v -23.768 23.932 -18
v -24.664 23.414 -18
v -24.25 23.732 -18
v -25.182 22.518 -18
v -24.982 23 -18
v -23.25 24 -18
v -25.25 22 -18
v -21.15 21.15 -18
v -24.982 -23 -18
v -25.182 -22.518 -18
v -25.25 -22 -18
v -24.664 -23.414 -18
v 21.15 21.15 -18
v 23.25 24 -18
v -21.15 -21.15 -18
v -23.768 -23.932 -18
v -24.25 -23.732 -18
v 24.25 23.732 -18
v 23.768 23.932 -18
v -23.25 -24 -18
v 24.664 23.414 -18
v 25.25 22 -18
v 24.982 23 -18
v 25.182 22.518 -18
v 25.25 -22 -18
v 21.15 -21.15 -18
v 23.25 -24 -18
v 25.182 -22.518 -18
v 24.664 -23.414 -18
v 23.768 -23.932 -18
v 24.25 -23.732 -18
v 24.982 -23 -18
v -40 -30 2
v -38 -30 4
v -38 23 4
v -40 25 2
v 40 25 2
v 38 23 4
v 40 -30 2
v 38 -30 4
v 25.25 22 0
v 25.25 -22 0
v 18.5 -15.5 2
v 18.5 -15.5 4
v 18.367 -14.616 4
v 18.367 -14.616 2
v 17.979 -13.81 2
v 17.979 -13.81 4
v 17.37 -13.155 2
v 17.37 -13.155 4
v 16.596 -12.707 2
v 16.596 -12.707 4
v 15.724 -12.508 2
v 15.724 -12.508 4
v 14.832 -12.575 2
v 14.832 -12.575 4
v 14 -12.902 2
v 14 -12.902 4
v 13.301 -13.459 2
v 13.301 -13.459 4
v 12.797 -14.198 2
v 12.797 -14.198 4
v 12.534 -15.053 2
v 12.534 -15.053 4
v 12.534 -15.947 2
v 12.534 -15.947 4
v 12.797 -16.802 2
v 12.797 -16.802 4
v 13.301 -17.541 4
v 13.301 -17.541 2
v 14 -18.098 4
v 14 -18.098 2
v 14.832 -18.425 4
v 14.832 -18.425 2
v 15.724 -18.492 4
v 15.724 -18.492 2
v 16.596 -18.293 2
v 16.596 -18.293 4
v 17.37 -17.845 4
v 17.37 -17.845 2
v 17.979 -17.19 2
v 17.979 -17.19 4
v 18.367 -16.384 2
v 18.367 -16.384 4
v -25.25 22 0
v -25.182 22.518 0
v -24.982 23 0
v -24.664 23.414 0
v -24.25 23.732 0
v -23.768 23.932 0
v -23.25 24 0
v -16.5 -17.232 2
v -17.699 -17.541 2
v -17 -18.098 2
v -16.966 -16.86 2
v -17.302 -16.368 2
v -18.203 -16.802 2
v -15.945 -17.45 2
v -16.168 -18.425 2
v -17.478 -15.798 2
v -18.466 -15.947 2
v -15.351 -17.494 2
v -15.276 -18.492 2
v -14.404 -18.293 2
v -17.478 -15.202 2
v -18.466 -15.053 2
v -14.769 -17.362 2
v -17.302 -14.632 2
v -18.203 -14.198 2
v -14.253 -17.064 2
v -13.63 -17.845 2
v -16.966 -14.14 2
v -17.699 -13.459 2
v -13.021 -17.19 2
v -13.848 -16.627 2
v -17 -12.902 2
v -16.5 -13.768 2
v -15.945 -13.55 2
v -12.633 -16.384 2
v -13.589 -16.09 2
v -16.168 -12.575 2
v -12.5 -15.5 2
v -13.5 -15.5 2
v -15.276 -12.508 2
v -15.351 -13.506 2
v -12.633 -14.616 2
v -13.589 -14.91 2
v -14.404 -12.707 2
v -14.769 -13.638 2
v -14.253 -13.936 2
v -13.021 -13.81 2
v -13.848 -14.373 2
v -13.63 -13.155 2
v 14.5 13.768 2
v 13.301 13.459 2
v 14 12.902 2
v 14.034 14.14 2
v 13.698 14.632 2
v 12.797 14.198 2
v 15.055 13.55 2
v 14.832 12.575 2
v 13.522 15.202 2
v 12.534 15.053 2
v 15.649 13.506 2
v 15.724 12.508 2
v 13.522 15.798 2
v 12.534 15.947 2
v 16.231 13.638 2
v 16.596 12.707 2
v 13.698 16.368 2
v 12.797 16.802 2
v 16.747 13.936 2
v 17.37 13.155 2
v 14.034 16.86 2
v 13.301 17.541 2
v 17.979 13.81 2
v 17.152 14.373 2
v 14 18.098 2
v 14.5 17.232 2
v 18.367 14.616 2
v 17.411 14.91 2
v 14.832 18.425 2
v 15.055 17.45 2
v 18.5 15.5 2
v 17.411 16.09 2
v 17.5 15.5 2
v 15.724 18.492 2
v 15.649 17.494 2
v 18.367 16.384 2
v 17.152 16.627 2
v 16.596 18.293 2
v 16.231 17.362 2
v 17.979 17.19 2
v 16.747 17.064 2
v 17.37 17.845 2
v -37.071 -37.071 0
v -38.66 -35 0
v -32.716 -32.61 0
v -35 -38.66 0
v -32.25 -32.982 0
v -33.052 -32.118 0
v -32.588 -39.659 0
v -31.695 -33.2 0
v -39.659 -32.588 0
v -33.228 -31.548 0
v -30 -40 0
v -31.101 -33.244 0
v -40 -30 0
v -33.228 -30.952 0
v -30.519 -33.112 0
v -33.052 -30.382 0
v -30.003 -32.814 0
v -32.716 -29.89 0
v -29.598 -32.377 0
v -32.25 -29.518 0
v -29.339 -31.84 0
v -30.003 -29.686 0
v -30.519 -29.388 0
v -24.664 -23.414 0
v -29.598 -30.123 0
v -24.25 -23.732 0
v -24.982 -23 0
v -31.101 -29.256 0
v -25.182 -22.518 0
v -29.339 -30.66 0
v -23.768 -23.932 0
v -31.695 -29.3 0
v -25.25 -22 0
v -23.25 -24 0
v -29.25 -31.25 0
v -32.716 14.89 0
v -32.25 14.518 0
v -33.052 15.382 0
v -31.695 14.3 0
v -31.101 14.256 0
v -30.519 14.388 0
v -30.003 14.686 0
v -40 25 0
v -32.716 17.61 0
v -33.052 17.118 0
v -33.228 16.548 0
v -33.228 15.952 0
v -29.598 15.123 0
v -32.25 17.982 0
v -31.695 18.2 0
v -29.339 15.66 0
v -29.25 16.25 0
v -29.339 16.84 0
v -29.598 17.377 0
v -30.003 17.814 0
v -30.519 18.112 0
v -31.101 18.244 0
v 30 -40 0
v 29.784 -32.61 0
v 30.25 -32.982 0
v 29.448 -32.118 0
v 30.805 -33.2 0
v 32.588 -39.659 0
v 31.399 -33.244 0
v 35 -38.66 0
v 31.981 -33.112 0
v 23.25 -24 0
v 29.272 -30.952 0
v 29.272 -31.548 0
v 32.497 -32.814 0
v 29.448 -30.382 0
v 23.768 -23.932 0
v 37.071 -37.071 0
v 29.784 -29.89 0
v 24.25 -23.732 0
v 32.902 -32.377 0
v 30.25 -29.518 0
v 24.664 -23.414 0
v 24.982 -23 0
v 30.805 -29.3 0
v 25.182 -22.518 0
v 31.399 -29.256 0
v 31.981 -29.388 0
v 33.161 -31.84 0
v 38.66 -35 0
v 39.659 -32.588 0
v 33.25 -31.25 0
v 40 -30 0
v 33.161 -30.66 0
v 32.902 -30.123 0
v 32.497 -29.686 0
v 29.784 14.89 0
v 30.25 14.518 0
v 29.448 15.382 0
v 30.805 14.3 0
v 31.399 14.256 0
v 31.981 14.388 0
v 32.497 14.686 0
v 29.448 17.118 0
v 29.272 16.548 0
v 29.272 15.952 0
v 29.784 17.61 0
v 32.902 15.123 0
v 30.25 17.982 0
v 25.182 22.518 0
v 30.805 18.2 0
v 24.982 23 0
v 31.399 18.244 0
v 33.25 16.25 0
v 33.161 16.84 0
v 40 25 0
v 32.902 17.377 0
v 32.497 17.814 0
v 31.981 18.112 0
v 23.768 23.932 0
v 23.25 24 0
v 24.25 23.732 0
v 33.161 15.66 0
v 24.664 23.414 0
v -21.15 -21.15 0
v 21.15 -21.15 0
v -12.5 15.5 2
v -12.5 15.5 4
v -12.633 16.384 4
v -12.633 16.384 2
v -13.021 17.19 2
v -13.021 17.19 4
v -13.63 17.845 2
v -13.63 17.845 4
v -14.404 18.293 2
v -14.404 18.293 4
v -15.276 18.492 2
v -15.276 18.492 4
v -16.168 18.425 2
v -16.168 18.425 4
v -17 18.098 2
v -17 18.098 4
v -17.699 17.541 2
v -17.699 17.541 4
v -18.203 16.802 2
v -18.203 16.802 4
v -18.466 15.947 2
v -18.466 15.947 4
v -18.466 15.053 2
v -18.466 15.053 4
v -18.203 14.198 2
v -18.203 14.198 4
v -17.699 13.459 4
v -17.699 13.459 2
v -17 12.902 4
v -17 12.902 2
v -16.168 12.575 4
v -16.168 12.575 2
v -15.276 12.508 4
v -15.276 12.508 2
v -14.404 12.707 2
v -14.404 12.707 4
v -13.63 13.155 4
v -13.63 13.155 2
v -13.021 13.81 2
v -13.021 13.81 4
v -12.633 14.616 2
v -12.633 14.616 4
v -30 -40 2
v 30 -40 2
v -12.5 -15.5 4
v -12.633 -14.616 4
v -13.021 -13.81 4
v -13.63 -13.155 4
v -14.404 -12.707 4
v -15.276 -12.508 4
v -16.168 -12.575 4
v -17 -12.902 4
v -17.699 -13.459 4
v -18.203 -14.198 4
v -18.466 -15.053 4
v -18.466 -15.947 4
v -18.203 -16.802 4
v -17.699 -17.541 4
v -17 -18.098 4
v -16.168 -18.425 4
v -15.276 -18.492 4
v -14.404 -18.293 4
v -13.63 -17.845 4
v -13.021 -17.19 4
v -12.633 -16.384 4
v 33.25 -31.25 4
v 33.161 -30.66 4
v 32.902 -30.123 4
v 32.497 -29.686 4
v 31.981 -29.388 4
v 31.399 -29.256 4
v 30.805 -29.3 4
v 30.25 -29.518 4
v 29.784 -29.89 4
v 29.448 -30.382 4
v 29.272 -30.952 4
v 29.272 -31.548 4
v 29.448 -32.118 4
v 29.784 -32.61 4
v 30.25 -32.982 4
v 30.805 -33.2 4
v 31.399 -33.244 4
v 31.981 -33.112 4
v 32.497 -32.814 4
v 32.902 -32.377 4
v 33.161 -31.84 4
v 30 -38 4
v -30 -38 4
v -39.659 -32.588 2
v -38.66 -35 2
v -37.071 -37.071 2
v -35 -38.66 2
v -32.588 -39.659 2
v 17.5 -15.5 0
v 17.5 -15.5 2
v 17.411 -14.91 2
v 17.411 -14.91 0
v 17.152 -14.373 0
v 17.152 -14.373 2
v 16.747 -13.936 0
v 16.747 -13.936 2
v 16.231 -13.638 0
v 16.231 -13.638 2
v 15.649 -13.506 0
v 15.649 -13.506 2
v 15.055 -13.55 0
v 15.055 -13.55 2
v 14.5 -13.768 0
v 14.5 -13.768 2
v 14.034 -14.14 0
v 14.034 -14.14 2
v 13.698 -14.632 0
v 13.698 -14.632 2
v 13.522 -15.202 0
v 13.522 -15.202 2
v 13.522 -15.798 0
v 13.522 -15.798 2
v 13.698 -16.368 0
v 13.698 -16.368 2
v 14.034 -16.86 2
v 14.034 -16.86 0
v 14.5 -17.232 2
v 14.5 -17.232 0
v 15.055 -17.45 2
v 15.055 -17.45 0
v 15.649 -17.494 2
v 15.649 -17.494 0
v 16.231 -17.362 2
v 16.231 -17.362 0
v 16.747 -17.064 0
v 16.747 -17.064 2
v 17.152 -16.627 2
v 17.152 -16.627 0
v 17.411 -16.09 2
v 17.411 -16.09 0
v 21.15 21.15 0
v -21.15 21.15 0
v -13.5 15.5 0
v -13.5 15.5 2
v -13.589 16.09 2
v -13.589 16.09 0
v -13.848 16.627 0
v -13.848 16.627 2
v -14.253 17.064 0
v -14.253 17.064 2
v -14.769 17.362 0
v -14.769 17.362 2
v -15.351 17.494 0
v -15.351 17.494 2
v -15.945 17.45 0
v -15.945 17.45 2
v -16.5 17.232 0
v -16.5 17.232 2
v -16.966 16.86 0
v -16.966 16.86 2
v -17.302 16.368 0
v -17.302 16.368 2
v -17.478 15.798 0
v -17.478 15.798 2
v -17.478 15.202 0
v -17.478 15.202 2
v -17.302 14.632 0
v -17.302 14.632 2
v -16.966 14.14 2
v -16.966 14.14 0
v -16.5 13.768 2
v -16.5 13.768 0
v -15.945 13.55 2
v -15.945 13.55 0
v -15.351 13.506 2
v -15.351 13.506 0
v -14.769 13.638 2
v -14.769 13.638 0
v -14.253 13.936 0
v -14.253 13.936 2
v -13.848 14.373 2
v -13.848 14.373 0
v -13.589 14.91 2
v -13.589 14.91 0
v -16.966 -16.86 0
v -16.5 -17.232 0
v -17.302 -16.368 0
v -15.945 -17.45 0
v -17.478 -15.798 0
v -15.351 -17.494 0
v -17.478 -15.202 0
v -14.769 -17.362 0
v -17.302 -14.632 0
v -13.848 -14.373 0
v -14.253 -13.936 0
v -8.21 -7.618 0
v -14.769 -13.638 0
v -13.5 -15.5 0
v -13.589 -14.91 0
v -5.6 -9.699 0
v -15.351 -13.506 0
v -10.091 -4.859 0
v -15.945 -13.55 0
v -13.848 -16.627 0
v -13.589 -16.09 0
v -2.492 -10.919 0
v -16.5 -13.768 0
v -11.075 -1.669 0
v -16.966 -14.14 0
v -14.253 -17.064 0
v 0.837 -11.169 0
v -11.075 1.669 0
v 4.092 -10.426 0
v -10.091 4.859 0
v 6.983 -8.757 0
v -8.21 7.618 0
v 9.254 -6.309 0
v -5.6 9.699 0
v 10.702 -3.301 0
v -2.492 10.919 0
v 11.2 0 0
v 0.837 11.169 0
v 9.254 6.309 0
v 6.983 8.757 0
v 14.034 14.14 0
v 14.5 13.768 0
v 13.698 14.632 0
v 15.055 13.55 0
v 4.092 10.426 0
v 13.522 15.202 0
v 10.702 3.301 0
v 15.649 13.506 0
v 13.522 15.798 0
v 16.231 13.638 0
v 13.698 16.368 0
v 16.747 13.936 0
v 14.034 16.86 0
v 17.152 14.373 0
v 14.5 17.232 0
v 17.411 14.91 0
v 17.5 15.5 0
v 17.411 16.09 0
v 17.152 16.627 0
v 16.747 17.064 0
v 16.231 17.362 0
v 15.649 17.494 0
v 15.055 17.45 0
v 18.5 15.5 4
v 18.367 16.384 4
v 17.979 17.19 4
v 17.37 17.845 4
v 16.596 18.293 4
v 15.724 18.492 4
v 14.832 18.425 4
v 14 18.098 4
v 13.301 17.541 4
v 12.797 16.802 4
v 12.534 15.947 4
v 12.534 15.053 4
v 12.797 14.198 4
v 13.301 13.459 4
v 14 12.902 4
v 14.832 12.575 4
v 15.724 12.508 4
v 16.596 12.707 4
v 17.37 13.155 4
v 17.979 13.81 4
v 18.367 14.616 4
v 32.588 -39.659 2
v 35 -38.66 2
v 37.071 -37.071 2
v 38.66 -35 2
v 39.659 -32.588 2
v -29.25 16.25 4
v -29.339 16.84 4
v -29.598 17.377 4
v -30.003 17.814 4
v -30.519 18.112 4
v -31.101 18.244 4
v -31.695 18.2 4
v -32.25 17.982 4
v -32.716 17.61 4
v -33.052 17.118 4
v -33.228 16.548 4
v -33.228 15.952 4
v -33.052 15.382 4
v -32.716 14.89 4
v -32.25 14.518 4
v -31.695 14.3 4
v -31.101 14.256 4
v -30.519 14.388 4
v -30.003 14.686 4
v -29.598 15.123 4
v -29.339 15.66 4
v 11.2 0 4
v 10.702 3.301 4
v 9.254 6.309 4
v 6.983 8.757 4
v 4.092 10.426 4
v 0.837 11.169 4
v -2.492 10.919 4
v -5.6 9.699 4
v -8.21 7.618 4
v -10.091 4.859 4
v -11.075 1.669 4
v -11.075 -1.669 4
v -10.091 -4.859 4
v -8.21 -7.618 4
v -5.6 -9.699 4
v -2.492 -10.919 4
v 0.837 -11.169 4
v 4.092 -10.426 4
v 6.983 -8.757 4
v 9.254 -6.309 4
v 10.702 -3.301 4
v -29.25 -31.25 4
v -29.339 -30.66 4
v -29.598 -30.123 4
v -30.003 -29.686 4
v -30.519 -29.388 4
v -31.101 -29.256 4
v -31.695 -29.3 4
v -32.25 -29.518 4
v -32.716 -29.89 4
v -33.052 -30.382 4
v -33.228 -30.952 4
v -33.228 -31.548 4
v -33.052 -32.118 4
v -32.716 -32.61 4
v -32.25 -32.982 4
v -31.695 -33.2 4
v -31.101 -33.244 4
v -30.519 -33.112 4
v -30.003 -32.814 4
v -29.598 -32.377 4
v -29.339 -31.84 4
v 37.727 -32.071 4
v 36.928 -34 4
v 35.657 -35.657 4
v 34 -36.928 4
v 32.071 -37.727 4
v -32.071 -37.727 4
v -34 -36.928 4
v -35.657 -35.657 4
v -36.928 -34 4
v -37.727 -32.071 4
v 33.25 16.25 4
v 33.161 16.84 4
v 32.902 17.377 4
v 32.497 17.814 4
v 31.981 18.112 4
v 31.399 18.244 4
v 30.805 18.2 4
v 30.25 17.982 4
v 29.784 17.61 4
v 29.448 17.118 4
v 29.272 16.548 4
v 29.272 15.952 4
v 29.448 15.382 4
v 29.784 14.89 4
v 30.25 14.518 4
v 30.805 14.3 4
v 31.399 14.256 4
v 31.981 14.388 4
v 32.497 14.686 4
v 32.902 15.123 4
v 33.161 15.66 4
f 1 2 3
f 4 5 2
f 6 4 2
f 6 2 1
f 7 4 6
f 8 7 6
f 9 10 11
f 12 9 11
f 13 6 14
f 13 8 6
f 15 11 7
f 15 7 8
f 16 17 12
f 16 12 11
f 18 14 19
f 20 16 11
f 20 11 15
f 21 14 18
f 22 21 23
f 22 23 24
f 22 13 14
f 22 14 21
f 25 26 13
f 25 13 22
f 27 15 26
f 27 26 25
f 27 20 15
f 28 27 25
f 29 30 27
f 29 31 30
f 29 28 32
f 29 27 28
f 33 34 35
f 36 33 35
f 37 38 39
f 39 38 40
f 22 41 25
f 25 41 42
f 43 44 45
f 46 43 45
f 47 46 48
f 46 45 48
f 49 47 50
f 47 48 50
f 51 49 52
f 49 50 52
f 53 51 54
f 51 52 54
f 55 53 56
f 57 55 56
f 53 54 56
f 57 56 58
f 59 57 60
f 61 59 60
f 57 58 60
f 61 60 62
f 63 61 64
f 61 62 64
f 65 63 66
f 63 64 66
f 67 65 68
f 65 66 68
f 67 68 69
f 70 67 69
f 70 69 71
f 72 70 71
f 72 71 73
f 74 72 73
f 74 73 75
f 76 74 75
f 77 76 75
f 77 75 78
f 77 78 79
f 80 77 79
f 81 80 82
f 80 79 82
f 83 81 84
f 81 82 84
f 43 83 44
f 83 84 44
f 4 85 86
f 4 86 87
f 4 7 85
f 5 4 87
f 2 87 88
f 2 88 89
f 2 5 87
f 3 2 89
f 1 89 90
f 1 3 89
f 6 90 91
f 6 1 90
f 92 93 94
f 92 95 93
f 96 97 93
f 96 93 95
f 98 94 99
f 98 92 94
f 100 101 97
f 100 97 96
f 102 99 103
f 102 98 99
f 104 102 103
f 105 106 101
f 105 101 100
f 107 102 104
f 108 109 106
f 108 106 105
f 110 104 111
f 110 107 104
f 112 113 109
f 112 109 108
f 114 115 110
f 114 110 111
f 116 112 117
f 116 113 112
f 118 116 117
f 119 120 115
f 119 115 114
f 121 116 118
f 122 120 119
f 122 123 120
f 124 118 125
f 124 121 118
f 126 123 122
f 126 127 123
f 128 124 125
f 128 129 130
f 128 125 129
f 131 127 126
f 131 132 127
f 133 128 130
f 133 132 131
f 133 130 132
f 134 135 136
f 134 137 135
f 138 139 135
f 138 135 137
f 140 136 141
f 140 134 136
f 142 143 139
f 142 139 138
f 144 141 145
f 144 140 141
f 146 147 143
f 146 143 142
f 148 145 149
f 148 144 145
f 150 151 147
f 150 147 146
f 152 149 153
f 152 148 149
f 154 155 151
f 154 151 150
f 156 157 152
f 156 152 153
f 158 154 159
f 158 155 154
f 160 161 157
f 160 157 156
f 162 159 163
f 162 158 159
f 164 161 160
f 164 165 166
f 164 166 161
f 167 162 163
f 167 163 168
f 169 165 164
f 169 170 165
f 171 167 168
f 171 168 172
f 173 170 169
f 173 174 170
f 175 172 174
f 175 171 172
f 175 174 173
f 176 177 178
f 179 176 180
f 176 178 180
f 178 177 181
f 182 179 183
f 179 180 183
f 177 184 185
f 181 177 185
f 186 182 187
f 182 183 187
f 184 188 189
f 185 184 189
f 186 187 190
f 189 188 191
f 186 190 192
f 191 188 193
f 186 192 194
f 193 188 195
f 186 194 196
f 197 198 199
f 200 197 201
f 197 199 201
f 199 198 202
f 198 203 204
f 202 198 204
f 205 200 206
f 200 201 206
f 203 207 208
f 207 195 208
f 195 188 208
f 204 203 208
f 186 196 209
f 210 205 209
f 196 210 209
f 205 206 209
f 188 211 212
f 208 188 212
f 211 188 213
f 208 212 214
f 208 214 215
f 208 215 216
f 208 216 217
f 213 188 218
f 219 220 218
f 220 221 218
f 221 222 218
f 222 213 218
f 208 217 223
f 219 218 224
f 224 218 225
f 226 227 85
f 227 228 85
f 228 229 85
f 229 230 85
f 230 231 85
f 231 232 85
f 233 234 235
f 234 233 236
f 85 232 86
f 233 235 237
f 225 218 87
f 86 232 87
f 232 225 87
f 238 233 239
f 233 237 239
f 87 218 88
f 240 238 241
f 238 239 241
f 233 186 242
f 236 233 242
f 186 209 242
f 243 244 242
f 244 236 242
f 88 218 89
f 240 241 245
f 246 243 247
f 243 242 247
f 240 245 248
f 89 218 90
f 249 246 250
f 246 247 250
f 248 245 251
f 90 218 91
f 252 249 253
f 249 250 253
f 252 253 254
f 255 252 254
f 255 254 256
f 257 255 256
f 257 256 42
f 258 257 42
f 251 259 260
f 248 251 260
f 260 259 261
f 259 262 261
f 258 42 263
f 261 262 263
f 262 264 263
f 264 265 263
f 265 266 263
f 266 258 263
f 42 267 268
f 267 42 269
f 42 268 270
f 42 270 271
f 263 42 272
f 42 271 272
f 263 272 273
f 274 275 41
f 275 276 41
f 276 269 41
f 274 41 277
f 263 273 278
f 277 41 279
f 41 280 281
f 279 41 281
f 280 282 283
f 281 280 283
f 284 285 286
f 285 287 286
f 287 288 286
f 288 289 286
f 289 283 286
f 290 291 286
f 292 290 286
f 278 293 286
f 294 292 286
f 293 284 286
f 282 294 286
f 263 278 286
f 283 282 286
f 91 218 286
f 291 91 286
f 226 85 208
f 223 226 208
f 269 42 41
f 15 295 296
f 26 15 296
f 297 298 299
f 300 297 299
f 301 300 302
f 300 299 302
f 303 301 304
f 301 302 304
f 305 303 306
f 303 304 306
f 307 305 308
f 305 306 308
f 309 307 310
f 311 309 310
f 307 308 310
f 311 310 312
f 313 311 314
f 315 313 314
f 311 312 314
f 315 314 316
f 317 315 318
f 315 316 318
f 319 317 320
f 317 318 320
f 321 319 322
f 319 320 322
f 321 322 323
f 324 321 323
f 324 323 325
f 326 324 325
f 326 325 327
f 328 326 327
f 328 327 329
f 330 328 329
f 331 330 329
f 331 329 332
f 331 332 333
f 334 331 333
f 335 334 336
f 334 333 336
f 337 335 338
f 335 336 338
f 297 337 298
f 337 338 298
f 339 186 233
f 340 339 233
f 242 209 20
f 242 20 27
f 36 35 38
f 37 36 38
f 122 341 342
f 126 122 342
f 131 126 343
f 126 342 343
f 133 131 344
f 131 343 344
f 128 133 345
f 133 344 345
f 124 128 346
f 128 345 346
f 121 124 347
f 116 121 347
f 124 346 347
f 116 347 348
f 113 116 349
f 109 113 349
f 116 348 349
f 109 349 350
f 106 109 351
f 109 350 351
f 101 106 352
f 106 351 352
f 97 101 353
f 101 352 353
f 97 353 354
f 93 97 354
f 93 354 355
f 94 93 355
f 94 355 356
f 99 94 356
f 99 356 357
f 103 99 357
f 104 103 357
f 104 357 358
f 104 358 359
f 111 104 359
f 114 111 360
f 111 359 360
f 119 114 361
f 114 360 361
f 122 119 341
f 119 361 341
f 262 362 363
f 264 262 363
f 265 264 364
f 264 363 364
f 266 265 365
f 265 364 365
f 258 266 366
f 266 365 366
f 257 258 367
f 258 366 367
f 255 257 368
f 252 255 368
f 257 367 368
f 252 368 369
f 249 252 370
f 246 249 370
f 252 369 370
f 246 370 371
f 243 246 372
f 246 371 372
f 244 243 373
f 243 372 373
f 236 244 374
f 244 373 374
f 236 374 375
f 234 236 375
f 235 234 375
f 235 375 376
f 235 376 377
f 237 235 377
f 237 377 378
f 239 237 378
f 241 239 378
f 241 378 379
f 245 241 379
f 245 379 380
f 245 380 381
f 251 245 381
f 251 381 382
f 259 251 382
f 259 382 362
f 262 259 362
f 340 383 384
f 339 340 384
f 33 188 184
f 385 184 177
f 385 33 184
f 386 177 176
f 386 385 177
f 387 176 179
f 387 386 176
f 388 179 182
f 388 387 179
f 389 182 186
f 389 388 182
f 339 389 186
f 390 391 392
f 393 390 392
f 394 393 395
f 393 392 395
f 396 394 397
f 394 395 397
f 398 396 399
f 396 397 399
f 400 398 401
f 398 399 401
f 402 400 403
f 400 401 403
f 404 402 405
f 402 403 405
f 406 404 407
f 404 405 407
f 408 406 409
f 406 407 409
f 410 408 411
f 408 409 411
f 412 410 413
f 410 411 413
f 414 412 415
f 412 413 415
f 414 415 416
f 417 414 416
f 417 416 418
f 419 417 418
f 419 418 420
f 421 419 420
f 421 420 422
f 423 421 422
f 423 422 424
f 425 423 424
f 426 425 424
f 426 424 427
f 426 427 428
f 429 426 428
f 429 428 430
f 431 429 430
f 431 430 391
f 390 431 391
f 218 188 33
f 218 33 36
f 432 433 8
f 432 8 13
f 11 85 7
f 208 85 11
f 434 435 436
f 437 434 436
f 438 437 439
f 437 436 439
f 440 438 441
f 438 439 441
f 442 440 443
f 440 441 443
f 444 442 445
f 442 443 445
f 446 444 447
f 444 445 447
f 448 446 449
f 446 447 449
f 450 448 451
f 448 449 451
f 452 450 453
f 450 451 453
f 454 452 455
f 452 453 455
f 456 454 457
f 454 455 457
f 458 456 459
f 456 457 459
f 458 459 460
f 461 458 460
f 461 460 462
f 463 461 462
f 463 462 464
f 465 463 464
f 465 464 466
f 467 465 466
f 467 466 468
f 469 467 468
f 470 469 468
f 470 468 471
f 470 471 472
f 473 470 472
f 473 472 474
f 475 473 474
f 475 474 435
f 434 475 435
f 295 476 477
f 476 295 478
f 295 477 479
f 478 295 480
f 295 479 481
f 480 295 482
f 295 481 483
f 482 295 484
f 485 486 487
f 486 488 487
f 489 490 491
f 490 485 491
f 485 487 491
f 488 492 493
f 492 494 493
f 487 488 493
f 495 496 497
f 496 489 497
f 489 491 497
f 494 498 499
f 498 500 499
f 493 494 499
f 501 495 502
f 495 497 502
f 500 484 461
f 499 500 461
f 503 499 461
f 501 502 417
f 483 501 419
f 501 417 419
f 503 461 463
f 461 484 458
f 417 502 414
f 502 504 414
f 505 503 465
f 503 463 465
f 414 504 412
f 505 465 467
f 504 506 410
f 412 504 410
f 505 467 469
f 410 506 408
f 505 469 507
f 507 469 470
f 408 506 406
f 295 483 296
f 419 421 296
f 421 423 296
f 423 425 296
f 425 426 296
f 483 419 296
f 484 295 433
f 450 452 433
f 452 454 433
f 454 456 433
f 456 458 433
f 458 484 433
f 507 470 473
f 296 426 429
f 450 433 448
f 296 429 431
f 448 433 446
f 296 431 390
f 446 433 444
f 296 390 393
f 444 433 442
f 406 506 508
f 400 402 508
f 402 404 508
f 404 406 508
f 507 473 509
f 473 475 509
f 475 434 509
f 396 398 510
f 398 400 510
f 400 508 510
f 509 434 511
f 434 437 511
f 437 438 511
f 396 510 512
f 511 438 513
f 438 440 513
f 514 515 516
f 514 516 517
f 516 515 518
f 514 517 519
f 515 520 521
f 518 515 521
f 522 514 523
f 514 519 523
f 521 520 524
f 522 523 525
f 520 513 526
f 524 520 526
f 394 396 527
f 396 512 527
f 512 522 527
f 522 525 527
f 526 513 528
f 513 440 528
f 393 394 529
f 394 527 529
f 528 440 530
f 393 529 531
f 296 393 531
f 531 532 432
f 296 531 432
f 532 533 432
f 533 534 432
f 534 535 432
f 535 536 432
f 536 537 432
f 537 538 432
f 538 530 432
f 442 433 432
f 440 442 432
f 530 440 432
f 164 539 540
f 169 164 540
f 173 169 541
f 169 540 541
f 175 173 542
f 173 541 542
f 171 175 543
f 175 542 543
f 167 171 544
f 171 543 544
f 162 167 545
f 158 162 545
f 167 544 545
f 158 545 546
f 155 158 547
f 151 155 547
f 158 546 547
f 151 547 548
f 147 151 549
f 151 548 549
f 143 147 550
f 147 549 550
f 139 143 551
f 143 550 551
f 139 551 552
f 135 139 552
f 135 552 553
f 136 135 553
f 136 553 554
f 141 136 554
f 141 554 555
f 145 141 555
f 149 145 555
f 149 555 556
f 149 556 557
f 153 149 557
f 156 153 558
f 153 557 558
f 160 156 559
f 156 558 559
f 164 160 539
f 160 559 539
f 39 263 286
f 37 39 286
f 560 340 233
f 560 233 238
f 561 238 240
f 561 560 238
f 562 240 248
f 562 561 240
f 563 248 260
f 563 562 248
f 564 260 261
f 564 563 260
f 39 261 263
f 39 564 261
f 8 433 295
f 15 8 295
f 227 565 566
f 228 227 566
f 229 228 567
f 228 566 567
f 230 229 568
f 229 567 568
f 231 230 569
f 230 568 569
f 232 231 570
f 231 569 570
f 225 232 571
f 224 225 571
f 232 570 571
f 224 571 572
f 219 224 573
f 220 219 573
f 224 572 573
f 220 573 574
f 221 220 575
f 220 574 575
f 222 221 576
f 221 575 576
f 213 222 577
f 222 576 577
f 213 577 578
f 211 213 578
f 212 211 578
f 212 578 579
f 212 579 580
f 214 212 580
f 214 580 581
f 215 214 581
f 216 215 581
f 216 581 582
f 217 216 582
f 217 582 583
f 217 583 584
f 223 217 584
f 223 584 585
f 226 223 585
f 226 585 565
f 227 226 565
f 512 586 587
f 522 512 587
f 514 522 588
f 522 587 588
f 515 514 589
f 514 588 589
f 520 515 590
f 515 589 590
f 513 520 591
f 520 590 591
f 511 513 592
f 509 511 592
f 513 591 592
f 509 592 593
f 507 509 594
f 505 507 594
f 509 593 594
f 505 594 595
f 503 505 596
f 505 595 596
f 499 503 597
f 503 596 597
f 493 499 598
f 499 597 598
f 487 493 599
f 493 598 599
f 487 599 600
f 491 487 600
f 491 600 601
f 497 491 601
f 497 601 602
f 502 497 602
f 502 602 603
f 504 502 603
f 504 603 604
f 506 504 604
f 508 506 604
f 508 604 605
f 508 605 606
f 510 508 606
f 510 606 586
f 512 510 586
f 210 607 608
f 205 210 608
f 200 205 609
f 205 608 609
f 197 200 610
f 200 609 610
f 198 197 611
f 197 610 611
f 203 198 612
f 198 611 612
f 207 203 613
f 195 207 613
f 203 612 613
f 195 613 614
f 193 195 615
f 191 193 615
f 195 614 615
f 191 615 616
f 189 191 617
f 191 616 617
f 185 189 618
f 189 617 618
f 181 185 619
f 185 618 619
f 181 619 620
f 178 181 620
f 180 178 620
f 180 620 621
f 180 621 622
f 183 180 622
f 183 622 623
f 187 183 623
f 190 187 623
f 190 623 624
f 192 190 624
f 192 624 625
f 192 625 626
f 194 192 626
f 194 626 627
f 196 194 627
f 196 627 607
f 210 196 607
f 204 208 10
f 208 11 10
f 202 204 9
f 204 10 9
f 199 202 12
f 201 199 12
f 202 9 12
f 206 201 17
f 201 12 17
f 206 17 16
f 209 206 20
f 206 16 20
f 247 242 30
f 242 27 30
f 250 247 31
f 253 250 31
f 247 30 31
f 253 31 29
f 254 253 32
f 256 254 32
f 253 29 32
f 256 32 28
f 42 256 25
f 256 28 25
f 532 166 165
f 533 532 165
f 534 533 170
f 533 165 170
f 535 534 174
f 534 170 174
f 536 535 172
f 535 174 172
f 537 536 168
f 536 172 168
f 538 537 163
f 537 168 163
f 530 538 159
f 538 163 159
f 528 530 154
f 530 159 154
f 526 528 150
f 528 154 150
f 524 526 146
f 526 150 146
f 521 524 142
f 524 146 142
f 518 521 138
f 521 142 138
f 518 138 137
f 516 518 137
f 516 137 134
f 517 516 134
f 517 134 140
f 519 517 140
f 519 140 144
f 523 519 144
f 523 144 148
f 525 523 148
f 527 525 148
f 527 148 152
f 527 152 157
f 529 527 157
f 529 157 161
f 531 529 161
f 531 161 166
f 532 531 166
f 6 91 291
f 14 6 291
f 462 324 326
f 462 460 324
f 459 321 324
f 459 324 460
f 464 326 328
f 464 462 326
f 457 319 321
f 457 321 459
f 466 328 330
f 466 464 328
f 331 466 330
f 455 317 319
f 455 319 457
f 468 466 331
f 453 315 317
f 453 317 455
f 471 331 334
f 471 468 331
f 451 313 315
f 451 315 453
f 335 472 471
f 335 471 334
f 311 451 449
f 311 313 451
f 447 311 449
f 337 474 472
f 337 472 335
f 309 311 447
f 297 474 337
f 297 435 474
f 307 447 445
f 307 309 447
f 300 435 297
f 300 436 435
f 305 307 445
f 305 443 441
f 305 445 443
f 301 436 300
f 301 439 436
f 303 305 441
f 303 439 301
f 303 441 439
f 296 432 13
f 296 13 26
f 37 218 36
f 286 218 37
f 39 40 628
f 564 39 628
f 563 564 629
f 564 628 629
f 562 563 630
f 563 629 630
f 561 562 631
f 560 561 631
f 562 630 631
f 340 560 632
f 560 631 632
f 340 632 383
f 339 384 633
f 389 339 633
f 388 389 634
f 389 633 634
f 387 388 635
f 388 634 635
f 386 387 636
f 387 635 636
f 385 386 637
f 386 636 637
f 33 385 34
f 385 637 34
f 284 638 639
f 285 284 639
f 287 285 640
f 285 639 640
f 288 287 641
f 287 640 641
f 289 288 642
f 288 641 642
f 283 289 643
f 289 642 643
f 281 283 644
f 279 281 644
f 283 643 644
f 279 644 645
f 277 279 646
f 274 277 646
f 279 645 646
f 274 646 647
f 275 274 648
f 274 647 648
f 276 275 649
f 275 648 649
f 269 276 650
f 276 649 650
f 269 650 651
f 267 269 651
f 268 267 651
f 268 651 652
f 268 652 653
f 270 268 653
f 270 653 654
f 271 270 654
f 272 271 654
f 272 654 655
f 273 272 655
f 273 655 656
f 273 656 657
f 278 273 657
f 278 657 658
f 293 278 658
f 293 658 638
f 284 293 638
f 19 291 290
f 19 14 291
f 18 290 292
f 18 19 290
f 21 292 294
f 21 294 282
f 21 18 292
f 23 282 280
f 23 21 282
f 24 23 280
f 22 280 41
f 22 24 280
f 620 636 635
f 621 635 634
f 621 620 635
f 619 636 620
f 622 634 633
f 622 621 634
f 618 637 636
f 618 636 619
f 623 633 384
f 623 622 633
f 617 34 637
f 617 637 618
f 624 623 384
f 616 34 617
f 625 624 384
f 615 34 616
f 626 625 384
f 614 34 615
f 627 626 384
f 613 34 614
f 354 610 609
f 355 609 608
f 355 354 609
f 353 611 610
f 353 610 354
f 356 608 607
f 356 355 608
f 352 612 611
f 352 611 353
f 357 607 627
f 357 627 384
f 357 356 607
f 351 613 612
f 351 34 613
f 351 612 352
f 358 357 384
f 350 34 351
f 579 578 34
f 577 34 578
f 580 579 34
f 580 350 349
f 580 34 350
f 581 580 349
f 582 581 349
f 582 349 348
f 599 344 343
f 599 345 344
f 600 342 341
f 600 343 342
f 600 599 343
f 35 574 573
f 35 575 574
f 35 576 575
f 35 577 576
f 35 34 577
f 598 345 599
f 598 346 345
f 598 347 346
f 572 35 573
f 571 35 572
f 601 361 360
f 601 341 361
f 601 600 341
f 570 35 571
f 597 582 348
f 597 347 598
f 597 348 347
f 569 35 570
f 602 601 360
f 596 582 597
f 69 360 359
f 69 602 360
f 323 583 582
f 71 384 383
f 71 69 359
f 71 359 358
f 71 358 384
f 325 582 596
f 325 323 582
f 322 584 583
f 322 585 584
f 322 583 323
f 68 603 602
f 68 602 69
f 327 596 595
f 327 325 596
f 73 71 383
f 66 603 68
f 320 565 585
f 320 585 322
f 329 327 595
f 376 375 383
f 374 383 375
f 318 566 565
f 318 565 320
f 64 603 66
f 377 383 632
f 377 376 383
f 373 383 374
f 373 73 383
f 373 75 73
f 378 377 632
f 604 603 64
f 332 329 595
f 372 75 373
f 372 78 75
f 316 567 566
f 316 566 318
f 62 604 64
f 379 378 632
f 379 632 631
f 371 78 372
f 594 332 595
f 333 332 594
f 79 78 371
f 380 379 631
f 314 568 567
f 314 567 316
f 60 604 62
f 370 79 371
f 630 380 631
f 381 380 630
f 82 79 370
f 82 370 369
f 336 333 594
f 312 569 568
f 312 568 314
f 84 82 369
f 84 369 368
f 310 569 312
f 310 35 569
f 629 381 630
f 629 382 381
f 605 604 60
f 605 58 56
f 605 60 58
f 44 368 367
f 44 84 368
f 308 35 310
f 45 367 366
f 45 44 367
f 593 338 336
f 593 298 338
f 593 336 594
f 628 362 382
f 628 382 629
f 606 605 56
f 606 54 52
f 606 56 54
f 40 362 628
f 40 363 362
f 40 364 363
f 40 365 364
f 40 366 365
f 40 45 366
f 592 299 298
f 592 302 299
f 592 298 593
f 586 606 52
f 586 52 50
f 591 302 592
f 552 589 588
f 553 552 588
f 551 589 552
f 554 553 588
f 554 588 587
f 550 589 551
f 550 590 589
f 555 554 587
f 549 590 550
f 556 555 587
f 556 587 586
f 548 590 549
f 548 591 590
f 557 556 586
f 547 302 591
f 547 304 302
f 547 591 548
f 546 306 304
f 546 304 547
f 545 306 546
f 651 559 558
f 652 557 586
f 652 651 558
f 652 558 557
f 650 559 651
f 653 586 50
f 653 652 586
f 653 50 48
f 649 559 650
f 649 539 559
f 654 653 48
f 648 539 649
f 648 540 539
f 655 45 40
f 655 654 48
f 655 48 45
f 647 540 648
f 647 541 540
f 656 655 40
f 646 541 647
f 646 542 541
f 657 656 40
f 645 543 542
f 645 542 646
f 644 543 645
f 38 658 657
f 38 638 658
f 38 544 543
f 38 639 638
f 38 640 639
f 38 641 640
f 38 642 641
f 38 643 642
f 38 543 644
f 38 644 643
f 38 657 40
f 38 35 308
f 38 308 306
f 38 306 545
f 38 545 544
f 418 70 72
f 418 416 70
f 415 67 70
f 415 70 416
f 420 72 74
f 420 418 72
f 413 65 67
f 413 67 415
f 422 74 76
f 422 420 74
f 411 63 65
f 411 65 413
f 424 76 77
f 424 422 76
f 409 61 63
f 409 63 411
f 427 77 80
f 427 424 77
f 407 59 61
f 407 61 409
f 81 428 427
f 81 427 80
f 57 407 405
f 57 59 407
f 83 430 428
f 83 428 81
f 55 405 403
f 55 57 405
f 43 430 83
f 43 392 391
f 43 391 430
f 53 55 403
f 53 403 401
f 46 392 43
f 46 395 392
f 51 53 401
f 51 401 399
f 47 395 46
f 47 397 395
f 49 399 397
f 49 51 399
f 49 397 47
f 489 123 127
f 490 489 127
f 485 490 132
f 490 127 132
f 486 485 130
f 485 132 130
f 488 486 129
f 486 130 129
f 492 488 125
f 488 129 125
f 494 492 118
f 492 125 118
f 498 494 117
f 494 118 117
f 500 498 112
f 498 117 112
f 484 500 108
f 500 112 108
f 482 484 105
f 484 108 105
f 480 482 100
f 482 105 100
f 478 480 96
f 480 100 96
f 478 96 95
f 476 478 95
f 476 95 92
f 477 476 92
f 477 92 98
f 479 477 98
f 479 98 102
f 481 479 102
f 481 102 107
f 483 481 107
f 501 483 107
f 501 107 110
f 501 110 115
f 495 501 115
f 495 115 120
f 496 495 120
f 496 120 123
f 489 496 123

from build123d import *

# Parameters (mm, degrees)
SKETCH_W        = 80
SKETCH_H        = 65
PAD_DEPTH       = 4
SKETCH001_R     = 11.2
POCKET_DEPTH    = 4.001
SKETCH002_R     = 2
POCKET001_DEPTH = 4.001
SKETCH003_W     = 50.5
SKETCH003_H     = 48
SKETCH003_W_2   = 42.3
SKETCH003_H_2   = 42.3
PAD001_DEPTH    = 18
SKETCH004_R     = 3
POCKET002_DEPTH = 2
SKETCH005_R     = 2
POCKET003_DEPTH = 22.001
FILLET_R        = 10
FILLET001_R     = 2
CHAMFER_SIZE    = 2


with BuildPart() as part:
    # Sketch → Pad (new body)
    with BuildSketch(Plane.XY):
        with Locations((0, -7.5)):
            Rectangle(SKETCH_W, SKETCH_H)
    extrude(amount=PAD_DEPTH)

    # Sketch001 (on Face6 of Pad) → Pocket (cut, through all)
    with BuildSketch(Plane.XY.offset(4)):
        Circle(SKETCH001_R)
    extrude(amount=-POCKET_DEPTH, mode=Mode.SUBTRACT)

    # Sketch002 (on Face5 of Pocket) → Pocket001 (cut, through all)
    with BuildSketch(Plane.XY.offset(4)):
        with Locations((-15.5, 15.5)):
            Circle(SKETCH002_R)
        with Locations((-15.5, -15.5)):
            Circle(SKETCH002_R)
        with Locations((15.5, -15.5)):
            Circle(SKETCH002_R)
        with Locations((15.5, 15.5)):
            Circle(SKETCH002_R)
    extrude(amount=-POCKET001_DEPTH, mode=Mode.SUBTRACT)

    # Sketch003 (on Face4 of Pocket001) → Pad001 (join)
    with BuildSketch(Plane(origin=(0, 0, 0), x_dir=(1, 0, 0), z_dir=(0, 0, -1))):
        Rectangle(SKETCH003_W, SKETCH003_H)
        Rectangle(SKETCH003_W_2, SKETCH003_H_2, mode=Mode.SUBTRACT)
    extrude(amount=PAD001_DEPTH)

    # Sketch004 (on Face5 of Pad001) → Pocket002 (cut)
    with BuildSketch(Plane.XY.offset(4)):
        with Locations((-15.5, 15.5)):
            Circle(SKETCH004_R)
        with Locations((15.5, 15.5)):
            Circle(SKETCH004_R)
        with Locations((15.5, -15.5)):
            Circle(SKETCH004_R)
        with Locations((-15.5, -15.5)):
            Circle(SKETCH004_R)
    extrude(amount=-POCKET002_DEPTH, mode=Mode.SUBTRACT)

    # Sketch005 (on Face5 of Pocket002) → Pocket003 (cut, through all)
    with BuildSketch(Plane.XY.offset(4)):
        with Locations((-31.25, 16.25)):
            Circle(SKETCH005_R)
        with Locations((31.25, 16.25)):
            Circle(SKETCH005_R)
        with Locations((31.25, -31.25)):
            Circle(SKETCH005_R)
        with Locations((-31.25, -31.25)):
            Circle(SKETCH005_R)
    extrude(amount=-POCKET003_DEPTH, mode=Mode.SUBTRACT)

    # Fillet
    fillet_edges = [part.edges().sort_by_distance(p)[0] for p in [
        (40, -40, 2),
        (-40, -40, 2),
    ]]
    fillet(fillet_edges, radius=FILLET_R)

    # Fillet001
    fillet001_edges = [part.edges().sort_by_distance(p)[0] for p in [
        (25.25, -24, -9),
        (25.25, 24, -9),
        (-25.25, -24, -9),
        (-25.25, 24, -9),
    ]]
    fillet(fillet001_edges, radius=FILLET001_R)

    # Chamfer
    chamfer_edges = [part.edges().sort_by_distance(p)[0] for p in [
        (0, 25, 4),
        (-40, -2.5, 4),
    ]]
    chamfer(chamfer_edges, length=CHAMFER_SIZE)


solid = part.part
